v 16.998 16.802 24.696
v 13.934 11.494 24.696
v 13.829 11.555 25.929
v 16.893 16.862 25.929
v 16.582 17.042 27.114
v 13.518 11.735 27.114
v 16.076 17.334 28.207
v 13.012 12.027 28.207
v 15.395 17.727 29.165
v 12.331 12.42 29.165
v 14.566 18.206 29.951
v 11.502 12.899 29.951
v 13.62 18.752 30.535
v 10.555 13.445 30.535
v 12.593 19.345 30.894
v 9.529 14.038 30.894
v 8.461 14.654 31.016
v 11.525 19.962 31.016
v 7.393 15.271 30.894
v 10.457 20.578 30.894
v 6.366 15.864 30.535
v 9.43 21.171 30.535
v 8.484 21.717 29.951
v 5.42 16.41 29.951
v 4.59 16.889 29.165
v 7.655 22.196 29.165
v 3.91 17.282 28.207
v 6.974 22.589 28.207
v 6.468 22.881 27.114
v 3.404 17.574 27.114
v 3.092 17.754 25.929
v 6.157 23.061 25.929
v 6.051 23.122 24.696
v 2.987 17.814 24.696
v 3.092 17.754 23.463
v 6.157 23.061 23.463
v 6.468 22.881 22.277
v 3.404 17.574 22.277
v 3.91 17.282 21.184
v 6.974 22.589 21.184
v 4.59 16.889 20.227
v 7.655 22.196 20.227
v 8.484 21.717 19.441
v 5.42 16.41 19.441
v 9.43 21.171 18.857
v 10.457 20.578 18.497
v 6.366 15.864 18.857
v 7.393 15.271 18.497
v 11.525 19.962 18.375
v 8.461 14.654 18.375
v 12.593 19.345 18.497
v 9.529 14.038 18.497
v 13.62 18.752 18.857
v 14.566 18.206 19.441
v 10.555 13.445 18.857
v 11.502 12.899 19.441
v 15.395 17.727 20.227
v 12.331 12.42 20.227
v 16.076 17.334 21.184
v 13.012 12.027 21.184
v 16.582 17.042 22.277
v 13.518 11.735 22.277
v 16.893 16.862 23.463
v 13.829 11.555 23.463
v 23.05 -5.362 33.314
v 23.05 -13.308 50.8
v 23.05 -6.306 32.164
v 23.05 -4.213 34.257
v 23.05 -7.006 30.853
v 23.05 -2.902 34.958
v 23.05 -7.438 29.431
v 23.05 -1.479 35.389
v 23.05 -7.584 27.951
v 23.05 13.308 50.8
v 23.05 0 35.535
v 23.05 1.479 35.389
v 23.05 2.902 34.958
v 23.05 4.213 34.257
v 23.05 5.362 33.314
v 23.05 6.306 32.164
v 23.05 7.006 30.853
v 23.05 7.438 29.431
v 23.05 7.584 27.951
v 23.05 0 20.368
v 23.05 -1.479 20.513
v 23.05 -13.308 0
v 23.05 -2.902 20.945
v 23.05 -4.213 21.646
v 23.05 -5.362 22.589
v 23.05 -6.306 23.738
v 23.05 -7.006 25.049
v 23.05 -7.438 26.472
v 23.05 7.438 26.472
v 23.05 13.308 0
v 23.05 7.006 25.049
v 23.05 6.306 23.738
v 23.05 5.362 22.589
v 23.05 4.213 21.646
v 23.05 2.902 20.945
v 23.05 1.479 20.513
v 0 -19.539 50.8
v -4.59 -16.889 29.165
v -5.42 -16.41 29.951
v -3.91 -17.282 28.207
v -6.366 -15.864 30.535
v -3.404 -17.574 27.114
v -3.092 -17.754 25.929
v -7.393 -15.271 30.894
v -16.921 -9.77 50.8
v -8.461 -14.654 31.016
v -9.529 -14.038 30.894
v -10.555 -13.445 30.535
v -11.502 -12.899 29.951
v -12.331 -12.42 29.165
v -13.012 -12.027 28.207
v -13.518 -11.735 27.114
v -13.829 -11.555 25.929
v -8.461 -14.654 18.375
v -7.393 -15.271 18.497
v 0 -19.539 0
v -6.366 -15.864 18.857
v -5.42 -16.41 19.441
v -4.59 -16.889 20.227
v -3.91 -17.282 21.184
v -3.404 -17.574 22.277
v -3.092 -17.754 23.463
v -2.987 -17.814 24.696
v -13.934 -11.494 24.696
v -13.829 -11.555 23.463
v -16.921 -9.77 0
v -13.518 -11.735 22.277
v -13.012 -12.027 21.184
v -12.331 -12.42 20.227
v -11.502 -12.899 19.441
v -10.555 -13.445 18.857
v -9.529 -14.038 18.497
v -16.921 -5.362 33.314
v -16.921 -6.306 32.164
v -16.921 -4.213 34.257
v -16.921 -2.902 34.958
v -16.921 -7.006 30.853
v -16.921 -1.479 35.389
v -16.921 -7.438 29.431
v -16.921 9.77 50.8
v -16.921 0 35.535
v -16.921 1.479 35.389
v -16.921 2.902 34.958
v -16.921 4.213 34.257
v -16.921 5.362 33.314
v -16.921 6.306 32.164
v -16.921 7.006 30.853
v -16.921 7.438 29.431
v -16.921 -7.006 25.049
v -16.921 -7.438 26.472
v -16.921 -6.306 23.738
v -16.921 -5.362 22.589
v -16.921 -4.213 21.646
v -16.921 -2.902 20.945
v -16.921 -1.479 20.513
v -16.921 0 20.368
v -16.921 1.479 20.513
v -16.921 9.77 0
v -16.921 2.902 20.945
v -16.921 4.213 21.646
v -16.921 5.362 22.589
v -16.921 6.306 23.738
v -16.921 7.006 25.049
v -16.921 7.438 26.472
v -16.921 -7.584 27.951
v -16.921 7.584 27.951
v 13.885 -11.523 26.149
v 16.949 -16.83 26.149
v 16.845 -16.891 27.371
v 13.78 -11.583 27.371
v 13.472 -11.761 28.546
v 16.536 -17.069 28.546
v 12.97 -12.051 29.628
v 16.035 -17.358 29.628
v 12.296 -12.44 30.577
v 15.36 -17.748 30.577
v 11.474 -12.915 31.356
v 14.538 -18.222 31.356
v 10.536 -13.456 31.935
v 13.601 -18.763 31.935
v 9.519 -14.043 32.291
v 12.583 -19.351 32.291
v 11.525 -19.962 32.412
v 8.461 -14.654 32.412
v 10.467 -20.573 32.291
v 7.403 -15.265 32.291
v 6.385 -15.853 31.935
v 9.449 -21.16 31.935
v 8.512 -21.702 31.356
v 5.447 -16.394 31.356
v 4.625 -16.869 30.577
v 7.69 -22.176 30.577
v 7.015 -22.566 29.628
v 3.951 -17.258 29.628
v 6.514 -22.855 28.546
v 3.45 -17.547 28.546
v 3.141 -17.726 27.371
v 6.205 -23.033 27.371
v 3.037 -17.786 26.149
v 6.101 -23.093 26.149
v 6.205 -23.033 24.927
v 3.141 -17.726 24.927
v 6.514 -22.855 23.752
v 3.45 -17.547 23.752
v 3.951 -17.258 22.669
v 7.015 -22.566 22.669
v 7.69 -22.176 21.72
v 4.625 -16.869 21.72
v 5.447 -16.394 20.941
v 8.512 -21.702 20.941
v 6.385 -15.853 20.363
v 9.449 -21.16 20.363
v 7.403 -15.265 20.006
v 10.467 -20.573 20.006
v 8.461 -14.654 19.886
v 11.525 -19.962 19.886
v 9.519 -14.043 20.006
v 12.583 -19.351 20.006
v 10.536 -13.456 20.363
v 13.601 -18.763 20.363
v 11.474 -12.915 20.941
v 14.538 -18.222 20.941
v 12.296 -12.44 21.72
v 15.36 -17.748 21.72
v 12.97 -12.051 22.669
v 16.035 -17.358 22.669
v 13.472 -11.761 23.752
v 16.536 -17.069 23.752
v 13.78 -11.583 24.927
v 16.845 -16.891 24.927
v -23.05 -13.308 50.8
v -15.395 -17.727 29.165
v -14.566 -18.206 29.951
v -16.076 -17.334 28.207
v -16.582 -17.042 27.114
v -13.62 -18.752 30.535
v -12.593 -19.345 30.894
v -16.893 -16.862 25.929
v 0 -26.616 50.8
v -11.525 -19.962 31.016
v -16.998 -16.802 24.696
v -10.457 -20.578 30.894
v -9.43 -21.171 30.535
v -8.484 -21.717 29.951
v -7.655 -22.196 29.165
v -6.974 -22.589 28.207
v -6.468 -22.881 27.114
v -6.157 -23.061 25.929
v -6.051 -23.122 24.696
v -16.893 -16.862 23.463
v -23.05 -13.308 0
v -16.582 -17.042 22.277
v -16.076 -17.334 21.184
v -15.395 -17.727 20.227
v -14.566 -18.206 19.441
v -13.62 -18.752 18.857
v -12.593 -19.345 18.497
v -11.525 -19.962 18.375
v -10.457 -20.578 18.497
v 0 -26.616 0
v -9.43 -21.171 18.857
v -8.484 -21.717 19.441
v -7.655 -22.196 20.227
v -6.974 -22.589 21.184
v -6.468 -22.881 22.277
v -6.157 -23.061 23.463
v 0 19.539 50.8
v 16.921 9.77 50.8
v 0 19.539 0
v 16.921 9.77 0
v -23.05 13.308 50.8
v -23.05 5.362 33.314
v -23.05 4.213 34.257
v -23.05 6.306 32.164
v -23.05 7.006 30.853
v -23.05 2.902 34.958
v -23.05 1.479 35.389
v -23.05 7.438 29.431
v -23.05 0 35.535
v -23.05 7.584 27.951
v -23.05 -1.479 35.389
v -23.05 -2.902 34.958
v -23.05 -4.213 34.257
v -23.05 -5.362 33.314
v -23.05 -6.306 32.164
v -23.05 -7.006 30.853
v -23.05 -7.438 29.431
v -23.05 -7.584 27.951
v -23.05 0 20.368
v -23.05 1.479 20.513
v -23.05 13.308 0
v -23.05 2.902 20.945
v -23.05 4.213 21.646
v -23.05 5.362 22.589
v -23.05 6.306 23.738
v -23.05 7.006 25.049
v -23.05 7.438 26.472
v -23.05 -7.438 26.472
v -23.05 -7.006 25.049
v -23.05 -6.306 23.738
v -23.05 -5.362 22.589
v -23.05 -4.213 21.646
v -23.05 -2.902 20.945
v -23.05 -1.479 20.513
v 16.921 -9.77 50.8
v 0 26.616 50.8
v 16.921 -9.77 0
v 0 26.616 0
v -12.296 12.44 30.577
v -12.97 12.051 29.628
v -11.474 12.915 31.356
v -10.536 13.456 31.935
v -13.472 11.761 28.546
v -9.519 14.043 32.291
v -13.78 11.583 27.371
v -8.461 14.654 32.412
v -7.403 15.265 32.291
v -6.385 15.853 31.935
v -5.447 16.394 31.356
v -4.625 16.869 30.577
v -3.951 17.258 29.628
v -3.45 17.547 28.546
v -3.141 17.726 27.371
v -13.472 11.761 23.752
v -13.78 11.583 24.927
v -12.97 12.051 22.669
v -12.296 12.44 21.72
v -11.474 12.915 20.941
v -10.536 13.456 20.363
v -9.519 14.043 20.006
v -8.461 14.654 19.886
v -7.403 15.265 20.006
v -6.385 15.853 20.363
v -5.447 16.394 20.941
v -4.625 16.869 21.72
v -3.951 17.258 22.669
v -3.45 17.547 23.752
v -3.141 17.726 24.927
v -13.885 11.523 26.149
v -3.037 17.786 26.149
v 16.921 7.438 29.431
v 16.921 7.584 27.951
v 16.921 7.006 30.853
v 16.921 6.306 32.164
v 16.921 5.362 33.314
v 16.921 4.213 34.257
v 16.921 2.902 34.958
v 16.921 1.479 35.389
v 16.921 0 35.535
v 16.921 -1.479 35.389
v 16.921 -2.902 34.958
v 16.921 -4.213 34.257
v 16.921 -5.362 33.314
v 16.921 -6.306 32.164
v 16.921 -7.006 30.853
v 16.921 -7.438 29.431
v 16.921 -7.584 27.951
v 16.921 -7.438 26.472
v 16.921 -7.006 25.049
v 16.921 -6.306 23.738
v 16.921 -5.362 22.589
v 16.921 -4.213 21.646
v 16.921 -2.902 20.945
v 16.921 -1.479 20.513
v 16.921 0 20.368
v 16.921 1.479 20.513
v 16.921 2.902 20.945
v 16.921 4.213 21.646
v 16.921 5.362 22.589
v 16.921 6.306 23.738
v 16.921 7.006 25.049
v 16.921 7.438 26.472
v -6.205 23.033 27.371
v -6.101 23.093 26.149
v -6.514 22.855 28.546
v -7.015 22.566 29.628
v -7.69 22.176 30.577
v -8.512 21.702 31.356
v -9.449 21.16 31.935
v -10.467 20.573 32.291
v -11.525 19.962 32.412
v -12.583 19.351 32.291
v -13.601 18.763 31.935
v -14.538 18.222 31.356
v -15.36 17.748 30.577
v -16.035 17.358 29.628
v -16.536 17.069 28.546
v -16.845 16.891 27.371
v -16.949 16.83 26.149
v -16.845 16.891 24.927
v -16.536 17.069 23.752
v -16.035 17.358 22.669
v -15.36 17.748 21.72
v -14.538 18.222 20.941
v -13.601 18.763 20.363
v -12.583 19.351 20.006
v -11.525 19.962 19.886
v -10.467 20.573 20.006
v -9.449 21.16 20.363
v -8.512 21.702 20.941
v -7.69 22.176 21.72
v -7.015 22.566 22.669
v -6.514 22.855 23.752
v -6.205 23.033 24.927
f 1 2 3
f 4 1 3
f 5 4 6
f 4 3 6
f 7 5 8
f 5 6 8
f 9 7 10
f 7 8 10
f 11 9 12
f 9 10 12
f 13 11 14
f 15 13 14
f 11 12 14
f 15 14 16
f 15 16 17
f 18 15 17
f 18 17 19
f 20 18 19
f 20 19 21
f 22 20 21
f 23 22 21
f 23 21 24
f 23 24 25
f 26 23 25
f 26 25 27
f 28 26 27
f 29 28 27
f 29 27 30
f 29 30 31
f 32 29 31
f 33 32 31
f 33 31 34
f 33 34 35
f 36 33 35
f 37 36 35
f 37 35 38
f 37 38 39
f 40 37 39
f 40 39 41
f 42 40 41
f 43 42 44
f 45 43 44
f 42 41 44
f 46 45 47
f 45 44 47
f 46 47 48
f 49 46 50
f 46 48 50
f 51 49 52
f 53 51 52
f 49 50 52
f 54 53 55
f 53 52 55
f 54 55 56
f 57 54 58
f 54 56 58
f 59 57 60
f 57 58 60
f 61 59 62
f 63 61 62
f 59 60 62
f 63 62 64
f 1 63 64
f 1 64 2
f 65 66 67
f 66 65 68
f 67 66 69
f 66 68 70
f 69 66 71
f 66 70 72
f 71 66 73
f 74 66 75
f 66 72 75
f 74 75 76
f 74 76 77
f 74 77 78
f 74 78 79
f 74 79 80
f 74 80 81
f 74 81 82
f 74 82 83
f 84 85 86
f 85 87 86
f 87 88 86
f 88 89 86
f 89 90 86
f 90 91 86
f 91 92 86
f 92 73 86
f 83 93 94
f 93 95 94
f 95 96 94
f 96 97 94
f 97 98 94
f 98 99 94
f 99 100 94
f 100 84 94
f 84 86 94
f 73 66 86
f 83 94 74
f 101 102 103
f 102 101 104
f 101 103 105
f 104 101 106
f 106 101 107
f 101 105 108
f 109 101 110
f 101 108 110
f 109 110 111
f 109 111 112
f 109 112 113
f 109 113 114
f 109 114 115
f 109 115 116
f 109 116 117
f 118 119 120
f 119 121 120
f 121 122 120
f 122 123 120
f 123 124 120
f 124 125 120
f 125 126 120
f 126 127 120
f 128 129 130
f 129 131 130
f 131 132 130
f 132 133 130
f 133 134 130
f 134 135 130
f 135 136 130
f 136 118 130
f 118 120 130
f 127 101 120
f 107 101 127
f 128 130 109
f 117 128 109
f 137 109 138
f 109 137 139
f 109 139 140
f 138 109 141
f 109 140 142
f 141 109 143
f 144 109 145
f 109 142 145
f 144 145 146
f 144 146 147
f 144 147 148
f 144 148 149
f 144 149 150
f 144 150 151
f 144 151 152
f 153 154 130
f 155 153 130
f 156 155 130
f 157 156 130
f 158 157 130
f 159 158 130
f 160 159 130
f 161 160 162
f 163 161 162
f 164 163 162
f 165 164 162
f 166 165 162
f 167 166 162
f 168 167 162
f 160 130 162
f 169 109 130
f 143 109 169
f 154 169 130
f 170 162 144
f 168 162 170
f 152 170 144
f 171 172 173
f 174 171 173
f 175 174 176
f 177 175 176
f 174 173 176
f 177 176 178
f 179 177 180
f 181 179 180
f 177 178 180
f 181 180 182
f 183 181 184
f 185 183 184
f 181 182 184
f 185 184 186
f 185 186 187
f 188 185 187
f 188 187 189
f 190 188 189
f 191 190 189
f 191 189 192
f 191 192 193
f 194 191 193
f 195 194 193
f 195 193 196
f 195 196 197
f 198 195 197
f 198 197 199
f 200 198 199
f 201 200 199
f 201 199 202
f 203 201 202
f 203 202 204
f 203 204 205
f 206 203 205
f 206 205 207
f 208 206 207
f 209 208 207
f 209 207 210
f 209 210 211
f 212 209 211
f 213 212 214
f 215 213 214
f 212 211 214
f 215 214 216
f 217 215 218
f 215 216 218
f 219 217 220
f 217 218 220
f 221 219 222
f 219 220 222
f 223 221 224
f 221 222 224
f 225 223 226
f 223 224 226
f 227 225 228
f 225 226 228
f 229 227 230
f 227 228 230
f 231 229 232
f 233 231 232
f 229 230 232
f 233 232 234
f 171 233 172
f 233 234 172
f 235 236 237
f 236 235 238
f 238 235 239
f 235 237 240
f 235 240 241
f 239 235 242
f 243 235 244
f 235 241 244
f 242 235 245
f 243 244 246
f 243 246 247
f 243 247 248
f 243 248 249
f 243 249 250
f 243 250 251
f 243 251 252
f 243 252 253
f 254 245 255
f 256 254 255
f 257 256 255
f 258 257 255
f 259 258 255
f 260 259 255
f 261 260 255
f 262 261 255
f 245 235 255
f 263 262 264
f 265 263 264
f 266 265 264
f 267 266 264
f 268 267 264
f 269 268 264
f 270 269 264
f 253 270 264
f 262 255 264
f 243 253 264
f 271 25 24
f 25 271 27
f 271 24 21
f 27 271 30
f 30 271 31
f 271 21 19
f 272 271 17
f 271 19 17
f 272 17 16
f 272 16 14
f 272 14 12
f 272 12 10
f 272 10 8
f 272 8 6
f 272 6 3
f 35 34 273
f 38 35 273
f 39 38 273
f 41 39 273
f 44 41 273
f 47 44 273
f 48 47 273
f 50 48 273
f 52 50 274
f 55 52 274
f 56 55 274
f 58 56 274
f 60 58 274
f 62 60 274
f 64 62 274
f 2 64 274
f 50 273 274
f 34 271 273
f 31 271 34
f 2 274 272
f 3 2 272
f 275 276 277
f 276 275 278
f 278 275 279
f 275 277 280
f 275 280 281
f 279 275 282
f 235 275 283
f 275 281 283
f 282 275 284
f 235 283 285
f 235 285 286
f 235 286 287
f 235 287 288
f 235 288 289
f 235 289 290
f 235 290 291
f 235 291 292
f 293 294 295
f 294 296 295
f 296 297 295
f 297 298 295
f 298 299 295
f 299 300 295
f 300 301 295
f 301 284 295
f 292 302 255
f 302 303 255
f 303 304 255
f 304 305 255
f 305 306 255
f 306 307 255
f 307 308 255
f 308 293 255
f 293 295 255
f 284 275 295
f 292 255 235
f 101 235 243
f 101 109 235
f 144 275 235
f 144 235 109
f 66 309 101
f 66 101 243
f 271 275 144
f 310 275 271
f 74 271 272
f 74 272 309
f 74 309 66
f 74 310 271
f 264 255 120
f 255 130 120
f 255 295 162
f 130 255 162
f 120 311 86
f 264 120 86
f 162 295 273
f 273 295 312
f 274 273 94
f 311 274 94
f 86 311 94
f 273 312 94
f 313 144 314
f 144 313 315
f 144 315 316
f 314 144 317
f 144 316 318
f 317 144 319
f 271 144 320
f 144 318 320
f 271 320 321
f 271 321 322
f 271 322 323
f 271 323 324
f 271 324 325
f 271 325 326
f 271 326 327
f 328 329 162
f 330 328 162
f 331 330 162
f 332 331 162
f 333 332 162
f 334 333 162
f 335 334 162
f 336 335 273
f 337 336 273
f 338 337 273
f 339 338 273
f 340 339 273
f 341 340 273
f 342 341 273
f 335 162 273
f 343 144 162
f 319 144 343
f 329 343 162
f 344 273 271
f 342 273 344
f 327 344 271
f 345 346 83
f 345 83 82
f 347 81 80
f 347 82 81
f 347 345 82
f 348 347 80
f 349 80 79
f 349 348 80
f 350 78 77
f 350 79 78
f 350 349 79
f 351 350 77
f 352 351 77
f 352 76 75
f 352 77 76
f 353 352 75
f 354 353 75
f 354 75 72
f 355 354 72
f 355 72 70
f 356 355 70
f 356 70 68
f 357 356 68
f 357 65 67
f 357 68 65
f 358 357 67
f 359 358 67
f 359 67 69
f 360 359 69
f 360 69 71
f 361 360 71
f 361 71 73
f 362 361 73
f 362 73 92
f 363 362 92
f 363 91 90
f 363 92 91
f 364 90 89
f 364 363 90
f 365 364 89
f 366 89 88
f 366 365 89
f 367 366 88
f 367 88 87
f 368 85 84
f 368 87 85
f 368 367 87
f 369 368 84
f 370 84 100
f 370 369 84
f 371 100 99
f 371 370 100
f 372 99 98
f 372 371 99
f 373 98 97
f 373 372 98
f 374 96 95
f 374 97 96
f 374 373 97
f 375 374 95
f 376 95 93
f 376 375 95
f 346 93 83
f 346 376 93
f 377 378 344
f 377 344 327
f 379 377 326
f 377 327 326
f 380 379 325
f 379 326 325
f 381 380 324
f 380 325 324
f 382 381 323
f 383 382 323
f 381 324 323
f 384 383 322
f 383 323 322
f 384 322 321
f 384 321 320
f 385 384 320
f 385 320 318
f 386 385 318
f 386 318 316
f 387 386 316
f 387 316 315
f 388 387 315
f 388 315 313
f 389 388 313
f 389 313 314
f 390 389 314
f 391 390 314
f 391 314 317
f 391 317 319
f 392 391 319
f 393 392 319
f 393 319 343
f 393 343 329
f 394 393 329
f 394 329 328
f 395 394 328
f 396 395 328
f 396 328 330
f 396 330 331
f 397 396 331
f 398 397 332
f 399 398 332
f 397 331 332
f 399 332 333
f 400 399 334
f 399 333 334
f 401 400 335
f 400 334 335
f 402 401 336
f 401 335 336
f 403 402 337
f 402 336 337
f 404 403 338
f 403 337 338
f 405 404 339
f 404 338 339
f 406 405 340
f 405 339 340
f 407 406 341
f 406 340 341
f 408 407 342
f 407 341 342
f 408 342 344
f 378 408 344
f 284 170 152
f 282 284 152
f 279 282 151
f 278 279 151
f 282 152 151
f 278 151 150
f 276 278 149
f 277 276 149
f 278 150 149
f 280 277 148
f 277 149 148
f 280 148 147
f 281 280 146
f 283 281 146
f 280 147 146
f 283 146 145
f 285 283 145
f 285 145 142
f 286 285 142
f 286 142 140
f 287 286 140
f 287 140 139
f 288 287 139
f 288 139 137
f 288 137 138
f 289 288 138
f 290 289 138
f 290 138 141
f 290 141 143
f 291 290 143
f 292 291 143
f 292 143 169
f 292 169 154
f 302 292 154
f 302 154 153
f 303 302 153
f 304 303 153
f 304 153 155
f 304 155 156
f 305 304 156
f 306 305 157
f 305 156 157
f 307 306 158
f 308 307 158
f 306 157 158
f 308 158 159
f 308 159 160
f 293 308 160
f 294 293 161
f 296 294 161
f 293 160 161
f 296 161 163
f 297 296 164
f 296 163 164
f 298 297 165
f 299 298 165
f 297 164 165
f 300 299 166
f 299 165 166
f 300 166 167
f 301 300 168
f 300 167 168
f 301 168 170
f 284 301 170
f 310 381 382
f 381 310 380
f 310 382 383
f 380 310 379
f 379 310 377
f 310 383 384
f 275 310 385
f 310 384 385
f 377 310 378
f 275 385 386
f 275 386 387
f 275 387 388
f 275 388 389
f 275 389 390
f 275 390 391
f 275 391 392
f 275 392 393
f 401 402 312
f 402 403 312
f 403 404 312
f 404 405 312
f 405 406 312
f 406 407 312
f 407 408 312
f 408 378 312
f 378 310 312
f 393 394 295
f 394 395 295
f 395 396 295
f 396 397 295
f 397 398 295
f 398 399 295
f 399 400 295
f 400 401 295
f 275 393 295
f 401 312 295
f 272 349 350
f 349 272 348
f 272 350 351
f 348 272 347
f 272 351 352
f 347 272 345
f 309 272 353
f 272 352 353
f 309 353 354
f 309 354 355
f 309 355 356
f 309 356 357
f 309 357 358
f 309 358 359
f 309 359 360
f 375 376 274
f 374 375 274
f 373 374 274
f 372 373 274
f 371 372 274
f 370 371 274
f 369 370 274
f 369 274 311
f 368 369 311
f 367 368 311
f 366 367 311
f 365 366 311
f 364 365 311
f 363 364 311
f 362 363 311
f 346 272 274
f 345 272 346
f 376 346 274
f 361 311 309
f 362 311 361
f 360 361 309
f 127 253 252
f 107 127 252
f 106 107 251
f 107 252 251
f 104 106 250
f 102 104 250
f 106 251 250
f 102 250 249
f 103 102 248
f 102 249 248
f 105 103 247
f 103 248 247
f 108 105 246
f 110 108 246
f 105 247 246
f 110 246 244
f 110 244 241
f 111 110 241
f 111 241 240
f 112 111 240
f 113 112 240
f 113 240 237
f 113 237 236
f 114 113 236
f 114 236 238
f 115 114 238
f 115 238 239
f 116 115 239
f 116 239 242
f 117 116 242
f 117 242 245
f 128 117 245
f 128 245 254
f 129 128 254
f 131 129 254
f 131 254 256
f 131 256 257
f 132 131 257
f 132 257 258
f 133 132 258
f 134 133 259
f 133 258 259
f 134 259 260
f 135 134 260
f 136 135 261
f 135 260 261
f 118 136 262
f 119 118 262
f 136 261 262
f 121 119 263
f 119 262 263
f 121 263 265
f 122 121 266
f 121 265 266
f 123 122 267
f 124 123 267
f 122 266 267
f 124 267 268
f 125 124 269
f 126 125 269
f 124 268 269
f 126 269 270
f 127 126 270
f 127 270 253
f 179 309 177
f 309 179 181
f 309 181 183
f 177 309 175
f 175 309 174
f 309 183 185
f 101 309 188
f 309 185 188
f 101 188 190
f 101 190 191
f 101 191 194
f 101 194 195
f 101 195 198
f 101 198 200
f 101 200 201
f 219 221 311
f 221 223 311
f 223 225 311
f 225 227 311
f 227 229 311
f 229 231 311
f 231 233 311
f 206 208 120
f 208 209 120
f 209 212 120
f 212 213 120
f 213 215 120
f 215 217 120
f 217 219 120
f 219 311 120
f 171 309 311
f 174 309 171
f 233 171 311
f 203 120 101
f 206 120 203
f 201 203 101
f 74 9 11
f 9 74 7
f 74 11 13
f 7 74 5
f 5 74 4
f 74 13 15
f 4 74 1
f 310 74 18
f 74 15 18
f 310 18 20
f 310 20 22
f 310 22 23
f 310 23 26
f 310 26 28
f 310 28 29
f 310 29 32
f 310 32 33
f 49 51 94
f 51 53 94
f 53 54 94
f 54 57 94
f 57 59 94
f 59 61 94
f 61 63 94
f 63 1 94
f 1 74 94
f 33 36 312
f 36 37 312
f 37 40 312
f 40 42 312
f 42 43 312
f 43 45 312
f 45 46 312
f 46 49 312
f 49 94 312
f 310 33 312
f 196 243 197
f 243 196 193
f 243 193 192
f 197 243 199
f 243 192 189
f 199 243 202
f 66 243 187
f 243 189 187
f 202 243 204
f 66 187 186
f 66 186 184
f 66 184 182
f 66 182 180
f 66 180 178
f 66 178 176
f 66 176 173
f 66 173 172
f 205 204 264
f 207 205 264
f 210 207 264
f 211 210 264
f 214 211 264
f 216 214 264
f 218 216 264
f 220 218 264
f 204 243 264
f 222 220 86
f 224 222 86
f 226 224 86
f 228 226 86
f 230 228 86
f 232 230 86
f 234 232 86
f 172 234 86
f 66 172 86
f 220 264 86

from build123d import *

# Parameters (mm, degrees)
F1_DEPTH = 50.8
F2_R     = 7.58365402
F3_DEPTH = 38.1
F4_DEPTH = 38.1
F5_R     = 6.3202279554
F6_DEPTH = 76.2
F7_R     = 6.2629522454
F8_DEPTH = 50.8


with BuildPart() as f1:
    # F0 (on Top) → F1 (new body)
    with BuildSketch(Plane.XY):
        Polygon((-23.0499133468, 13.3078736756), (-23.0499133468, -13.3078736756), (0, -26.6157473511), (23.0499133468, -13.3078736756), (23.0499133468, 13.3078736756), (0, 26.6157473511), align=None)
        Polygon((0, -19.5391465708), (-16.9213972986, -9.7695732854), (-16.9213972986, 9.7695732854), (0, 19.5391465708), (16.9213972986, 9.7695732854), (16.9213972986, -9.7695732854), align=None, mode=Mode.SUBTRACT)
    extrude(amount=F1_DEPTH)

    # F2 (on Right) → F3 (cut)
    with BuildSketch(Plane.YZ):
        with Locations((0, 27.9511734843)):
            Circle(F2_R)
    extrude(amount=F3_DEPTH, mode=Mode.SUBTRACT)

    # F2 (on Right) → F4 (cut)
    with BuildSketch(Plane.YZ):
        with Locations((0, 27.9511734843)):
            Circle(F2_R)
    extrude(amount=-F4_DEPTH, mode=Mode.SUBTRACT)

    # F5 (on face) → F6 (cut)
    with BuildSketch(Plane(origin=(-11.5249566734, -19.9618105133, 0), x_dir=(0.8660254038, -0.5, 0), z_dir=(-0.5, -0.8660254038, 0))):
        with Locations((0, 24.6956739575)):
            Circle(F5_R)
    extrude(amount=-F6_DEPTH, mode=Mode.SUBTRACT)

    # F7 (on face) → F8 (cut)
    with BuildSketch(Plane(origin=(11.5249566734, -19.9618105133, 0), x_dir=(0.8660254038, 0.5, 0), z_dir=(0.5, -0.8660254038, 0))):
        with Locations((0, 26.1488687247)):
            Circle(F7_R)
    extrude(amount=-F8_DEPTH, mode=Mode.SUBTRACT)


solid = f1.part
